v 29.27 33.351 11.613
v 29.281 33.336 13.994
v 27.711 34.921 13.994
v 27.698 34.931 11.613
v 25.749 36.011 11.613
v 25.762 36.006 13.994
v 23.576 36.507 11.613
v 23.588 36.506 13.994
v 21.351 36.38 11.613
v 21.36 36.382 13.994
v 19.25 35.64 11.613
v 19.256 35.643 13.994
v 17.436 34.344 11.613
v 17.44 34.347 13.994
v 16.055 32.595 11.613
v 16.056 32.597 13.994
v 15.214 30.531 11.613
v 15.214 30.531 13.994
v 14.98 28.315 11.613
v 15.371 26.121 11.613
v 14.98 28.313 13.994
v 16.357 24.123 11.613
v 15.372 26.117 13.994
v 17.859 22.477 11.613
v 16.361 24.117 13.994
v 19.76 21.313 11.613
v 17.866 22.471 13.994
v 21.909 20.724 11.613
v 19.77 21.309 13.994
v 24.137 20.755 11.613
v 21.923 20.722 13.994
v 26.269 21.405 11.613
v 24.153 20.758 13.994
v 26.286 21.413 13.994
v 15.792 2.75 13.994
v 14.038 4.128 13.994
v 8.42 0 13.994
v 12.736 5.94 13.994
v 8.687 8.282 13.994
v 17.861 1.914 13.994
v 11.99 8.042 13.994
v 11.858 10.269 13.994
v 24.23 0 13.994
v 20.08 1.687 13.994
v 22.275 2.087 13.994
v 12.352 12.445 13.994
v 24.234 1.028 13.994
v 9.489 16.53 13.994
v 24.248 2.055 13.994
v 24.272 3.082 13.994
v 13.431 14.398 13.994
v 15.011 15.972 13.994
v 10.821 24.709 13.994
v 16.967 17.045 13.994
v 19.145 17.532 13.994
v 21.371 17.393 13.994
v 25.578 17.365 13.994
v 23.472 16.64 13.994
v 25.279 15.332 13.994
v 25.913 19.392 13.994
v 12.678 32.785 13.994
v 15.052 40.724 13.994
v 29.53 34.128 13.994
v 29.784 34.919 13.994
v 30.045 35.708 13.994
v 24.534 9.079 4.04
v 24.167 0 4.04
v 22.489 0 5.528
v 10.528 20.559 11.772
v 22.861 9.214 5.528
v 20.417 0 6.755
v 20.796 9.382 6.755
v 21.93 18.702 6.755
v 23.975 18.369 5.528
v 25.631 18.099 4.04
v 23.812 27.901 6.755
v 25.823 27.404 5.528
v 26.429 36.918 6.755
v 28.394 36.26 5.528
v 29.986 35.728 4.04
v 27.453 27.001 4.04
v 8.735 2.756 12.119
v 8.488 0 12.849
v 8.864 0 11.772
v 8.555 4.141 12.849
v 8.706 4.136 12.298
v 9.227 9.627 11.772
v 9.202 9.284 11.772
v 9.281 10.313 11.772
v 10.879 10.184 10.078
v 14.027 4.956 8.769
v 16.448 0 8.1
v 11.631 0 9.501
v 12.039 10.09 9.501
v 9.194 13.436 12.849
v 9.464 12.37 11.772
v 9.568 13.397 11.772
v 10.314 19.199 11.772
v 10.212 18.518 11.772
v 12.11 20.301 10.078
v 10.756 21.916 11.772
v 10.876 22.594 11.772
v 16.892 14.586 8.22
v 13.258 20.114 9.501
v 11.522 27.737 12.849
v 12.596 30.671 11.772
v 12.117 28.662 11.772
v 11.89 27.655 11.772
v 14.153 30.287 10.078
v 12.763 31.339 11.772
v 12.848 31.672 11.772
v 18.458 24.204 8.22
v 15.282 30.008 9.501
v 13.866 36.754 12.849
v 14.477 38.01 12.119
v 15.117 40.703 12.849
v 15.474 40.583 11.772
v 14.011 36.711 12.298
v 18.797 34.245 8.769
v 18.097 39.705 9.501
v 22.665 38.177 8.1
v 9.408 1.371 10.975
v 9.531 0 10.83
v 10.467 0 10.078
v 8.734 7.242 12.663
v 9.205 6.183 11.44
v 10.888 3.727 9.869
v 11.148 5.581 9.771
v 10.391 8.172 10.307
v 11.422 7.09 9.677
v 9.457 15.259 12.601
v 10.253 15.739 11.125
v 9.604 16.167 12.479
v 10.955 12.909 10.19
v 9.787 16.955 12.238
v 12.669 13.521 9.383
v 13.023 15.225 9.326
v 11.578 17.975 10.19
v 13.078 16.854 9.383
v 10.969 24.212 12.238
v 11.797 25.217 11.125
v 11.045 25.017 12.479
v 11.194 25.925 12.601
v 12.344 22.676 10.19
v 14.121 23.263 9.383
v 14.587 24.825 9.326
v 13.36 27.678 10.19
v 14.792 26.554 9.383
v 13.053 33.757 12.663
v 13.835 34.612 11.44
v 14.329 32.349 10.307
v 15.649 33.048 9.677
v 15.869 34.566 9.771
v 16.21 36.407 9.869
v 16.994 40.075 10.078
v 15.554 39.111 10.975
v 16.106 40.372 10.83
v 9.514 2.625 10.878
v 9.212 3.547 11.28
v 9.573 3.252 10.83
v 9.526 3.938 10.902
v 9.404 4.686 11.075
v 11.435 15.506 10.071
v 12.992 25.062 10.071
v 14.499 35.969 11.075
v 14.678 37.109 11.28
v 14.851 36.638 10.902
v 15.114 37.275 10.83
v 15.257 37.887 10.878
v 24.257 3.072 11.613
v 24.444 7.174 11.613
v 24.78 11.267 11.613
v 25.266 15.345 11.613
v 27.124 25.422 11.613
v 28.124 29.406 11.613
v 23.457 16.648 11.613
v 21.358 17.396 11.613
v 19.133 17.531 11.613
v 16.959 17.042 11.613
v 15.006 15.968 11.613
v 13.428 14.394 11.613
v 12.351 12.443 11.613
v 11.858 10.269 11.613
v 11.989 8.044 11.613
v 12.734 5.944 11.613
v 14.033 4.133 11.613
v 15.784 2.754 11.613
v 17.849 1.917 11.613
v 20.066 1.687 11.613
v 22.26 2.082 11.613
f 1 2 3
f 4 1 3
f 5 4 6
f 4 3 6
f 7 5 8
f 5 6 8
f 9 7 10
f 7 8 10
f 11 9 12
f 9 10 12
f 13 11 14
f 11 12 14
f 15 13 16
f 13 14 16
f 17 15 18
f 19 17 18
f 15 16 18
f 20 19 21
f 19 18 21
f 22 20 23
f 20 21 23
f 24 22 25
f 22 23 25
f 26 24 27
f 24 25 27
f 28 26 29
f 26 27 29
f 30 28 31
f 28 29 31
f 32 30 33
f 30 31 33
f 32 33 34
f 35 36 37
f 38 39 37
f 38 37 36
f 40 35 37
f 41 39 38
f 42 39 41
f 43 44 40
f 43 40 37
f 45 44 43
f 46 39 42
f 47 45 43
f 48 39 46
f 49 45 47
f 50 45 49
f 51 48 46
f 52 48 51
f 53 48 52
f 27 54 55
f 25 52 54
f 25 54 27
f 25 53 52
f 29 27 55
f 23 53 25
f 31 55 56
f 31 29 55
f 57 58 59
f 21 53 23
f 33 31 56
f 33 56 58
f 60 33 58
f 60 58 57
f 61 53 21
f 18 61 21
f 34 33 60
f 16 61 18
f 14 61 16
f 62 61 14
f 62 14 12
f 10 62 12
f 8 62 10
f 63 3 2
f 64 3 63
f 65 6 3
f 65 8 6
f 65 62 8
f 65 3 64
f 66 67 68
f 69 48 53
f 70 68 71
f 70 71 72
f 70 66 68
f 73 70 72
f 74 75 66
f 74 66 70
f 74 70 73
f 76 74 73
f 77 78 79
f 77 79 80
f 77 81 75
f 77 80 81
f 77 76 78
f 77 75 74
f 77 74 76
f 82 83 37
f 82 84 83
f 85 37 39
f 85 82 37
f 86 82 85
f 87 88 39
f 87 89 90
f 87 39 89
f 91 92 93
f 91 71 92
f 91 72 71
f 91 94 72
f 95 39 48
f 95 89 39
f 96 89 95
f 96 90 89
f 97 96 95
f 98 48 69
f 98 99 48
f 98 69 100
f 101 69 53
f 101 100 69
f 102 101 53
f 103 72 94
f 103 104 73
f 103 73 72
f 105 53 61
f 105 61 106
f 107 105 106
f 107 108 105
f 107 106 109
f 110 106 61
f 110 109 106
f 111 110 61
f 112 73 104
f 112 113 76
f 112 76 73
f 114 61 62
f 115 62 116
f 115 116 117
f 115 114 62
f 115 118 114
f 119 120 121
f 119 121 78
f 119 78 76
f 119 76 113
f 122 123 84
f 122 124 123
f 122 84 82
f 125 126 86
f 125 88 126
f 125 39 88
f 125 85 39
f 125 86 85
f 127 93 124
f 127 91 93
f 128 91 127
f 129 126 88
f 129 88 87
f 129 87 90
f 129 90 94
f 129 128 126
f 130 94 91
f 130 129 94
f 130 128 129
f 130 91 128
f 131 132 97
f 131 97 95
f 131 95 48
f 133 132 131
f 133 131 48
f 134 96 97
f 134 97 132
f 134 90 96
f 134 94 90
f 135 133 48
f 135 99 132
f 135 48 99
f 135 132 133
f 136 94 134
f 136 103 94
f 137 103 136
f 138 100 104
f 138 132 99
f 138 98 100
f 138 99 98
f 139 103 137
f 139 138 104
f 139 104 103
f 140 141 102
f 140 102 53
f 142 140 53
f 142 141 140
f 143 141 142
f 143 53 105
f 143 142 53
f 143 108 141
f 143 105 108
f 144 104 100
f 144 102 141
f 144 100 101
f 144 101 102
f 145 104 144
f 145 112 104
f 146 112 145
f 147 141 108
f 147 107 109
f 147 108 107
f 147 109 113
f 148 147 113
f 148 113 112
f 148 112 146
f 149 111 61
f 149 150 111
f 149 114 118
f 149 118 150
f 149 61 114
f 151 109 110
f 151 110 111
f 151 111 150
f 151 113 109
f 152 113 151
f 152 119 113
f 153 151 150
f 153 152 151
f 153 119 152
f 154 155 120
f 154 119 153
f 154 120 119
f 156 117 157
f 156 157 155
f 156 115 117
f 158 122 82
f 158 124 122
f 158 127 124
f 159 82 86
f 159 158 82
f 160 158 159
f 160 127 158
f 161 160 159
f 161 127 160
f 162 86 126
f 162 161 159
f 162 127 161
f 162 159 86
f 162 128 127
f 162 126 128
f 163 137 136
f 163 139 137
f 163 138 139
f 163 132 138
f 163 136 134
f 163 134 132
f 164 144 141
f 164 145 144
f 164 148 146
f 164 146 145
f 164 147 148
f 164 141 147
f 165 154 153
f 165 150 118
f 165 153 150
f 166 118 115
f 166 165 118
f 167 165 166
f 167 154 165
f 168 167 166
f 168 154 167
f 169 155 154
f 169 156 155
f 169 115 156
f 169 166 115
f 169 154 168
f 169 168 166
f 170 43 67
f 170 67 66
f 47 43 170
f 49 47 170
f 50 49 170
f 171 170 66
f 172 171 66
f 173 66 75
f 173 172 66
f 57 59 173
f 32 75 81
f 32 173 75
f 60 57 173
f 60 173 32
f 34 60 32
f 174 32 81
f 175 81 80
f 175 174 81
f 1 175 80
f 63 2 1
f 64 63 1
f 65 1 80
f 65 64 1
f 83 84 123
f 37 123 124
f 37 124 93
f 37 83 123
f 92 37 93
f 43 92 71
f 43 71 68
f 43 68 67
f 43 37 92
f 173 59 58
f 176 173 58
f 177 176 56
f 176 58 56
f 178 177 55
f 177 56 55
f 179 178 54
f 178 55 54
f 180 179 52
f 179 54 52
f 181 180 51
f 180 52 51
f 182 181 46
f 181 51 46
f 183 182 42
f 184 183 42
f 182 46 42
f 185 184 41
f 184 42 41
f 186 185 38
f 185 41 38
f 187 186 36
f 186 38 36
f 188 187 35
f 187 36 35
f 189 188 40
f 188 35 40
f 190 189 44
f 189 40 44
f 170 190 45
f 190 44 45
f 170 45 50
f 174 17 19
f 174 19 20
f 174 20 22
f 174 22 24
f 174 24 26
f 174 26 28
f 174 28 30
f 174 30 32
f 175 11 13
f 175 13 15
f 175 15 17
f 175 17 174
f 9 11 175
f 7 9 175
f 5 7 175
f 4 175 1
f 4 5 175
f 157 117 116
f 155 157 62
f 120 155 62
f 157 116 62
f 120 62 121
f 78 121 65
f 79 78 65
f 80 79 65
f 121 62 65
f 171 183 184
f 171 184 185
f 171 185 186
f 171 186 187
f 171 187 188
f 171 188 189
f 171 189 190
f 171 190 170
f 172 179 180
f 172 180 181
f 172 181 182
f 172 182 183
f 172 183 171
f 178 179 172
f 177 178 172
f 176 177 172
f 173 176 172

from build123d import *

# Parameters (mm, degrees)
F1_ANGLE = 18.5
F2_R     = 7.9375
F3_DEPTH = 2.38125


with BuildPart() as f1:
    # F0 (on Front) → F1 (revolve)
    with BuildSketch(Plane.XZ):
        with BuildLine():
            Line((24.2297330525, 13.9939050769), (8.419544983, 13.9939050769))
            add(Edge.make_bspline(
                [(8.419544983, 13.9939050769), (8.3193296588, 12.729684062), (9.3964822164, 9.926852923), (14.9424578975, 8.5146570379), (21.1633145653, 6.8517774271), (23.2589200169, 4.9192732328), (24.1671312945, 4.0402704404)],
                knots=[0.4603012927, 0.4603012927, 0.4603012927, 0.4603012927, 0.5552126989, 0.6720441254, 0.8004871988, 0.8904119657, 0.8904119657, 0.8904119657, 0.8904119657], degree=3))
            Line((24.1671312945, 4.0402704404), (24.2297330525, 13.9939050769))
        make_face()
    revolve(axis=Axis((136.7642762608, 0, 8.3261267356), (0, 0, -1)), revolution_arc=F1_ANGLE)

    # F2 (on face) → F3 (cut)
    with BuildSketch(Plane.XY.offset(13.9939050769)):
        with Locations((22.9123420723, 28.597757378)):
            Circle(F2_R)
        with Locations((19.7691471926, 9.6189003033)):
            Circle(F2_R)
    extrude(amount=-F3_DEPTH, mode=Mode.SUBTRACT)


solid = f1.part
